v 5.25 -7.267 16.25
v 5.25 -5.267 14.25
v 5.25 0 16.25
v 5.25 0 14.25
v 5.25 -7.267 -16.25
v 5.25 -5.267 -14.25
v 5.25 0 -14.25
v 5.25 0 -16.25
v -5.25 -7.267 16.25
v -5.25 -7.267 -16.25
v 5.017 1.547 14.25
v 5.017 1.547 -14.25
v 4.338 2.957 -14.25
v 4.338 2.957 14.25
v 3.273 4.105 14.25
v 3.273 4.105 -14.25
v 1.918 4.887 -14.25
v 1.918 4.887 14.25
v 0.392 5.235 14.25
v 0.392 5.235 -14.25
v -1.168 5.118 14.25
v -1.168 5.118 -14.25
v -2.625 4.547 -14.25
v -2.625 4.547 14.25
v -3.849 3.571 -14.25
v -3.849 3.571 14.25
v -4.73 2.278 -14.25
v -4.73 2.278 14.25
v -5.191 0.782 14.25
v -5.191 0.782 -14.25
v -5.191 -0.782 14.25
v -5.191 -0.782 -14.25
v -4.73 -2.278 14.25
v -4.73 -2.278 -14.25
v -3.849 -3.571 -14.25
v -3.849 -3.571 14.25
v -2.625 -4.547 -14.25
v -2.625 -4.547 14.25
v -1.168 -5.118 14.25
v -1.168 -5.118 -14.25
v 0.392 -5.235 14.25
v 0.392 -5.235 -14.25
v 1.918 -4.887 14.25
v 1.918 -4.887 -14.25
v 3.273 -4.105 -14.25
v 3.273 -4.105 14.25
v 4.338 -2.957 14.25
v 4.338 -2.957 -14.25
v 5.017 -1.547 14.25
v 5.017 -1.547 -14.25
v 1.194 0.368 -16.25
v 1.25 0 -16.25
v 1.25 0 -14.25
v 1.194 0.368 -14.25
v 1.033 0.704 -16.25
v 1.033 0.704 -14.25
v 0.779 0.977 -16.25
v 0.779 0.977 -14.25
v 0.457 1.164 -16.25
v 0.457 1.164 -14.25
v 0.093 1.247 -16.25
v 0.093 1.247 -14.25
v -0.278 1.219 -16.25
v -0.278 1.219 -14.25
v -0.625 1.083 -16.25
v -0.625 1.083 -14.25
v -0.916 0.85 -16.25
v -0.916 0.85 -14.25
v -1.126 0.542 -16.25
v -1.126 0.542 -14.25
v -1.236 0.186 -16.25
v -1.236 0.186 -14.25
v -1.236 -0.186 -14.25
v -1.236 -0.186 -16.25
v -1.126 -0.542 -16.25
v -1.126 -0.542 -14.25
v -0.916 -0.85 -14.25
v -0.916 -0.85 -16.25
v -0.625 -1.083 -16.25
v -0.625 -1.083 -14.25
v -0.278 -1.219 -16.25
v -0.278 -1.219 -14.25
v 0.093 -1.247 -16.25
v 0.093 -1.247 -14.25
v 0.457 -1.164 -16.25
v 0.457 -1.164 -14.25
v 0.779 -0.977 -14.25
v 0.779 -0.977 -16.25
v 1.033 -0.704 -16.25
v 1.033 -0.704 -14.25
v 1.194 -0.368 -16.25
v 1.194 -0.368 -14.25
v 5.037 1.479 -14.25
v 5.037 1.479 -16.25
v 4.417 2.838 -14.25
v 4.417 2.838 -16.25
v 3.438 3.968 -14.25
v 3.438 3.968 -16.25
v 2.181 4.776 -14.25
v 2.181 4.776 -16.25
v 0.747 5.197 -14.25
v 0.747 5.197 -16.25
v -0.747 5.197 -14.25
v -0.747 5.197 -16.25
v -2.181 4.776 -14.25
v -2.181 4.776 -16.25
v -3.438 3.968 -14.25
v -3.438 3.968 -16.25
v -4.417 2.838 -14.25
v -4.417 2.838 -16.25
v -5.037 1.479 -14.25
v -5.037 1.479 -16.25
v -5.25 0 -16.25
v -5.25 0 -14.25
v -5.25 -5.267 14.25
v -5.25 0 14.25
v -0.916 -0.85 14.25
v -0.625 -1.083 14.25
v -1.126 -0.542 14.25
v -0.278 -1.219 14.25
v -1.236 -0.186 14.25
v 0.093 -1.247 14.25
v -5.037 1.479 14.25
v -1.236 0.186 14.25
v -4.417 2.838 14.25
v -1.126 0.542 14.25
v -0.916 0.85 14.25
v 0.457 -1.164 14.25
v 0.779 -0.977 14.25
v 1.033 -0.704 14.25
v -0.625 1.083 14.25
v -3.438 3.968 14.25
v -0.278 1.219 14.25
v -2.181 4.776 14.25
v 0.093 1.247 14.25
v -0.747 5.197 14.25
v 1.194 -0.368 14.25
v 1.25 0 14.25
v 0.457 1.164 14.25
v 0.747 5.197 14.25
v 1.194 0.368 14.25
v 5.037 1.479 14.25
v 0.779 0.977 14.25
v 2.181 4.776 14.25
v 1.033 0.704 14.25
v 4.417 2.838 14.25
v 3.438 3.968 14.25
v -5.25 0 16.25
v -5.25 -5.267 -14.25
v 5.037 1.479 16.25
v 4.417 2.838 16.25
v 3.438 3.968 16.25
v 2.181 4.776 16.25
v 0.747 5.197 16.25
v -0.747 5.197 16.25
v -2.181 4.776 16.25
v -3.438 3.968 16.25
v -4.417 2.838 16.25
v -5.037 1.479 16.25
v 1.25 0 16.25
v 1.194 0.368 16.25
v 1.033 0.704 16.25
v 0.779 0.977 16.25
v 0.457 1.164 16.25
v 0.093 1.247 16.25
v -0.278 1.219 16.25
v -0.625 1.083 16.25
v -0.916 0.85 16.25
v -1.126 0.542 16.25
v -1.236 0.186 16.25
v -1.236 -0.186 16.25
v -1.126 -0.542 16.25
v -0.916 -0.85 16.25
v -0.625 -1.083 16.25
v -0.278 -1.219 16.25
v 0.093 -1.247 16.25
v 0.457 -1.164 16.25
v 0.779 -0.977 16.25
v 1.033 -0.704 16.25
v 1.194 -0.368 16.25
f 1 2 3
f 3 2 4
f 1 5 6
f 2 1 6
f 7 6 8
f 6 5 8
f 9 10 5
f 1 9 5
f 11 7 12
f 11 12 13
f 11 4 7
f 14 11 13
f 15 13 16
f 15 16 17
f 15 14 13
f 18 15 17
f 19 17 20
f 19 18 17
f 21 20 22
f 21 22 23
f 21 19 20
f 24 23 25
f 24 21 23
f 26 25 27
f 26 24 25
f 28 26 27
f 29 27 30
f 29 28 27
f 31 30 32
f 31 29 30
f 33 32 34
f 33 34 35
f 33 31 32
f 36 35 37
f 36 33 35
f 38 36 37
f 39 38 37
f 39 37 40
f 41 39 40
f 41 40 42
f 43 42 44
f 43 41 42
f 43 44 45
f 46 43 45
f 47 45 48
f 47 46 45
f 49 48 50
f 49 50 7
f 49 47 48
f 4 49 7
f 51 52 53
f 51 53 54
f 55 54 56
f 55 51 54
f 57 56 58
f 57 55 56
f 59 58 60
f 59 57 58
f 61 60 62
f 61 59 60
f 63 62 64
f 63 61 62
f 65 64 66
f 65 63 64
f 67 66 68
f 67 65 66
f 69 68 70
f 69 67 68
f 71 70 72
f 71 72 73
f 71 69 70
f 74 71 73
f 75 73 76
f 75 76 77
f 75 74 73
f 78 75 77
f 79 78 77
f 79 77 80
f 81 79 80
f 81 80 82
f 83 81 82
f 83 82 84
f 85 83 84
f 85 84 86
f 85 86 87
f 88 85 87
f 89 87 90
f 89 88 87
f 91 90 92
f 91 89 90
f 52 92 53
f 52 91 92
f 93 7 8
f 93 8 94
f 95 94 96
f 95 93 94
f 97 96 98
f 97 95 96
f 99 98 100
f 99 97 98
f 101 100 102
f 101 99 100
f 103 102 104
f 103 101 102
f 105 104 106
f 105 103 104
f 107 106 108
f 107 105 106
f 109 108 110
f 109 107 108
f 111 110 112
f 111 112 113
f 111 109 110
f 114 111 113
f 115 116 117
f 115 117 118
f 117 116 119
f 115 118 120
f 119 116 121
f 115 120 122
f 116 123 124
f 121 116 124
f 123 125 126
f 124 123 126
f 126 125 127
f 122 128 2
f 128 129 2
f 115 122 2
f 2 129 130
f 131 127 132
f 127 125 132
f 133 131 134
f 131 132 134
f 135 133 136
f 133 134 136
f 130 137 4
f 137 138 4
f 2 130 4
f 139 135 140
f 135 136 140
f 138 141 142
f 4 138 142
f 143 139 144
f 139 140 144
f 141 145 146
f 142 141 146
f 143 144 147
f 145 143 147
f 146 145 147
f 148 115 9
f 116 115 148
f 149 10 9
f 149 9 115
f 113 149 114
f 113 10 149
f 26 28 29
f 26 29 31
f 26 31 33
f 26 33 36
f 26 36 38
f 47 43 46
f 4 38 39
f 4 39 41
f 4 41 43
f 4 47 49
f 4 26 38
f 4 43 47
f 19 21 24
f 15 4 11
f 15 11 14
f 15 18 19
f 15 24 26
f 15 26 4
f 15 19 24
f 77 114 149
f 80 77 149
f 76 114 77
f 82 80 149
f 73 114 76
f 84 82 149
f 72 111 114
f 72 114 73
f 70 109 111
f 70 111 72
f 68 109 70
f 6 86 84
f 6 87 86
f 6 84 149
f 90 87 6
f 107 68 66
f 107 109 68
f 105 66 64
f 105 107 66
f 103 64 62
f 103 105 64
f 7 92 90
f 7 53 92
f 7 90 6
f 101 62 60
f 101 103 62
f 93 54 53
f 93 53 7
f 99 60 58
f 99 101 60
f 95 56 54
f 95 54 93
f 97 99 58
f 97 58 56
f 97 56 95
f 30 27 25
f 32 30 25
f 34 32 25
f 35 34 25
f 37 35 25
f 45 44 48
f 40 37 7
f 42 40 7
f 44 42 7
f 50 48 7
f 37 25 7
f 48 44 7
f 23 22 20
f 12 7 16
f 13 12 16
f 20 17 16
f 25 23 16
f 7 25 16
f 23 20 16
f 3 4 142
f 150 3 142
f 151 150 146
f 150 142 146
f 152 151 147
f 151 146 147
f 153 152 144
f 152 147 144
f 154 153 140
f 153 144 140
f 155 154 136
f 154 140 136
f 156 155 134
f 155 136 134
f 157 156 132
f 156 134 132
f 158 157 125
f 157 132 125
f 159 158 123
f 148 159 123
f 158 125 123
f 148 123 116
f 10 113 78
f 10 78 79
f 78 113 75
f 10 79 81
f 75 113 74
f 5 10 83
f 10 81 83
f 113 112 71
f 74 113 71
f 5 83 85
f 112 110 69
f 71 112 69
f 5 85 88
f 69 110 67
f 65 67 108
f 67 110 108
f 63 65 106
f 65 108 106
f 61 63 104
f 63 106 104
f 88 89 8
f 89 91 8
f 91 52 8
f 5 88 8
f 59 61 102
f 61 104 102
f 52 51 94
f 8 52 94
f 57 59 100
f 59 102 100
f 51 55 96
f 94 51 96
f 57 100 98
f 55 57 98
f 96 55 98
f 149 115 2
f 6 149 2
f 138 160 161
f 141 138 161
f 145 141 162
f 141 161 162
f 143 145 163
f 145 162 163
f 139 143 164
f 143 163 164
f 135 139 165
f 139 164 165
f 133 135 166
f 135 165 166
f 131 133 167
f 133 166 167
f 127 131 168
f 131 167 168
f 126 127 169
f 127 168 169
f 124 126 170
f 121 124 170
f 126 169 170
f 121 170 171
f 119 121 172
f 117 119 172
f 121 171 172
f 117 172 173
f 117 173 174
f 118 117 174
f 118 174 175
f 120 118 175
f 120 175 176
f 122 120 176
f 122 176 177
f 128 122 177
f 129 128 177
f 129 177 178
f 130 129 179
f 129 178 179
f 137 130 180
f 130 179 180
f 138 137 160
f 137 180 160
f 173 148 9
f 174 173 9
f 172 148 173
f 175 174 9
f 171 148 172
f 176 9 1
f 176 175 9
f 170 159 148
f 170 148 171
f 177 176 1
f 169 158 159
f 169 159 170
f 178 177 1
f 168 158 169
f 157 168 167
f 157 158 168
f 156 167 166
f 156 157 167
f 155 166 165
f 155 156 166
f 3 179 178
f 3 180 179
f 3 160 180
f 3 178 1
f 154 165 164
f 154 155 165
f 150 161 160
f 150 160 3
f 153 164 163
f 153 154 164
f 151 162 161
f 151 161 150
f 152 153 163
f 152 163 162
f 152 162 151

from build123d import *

# Parameters (mm, degrees)
F0_R     = 5.25
F1_DEPTH = 14.25
F3_DEPTH = 2
F4_W     = 10.5
F4_H     = 2
F5_DEPTH = 16.25
F6_R     = 1.25
F7_DEPTH = 2


with BuildPart() as f1:
    # F0 (on Top) → F1 (new body, symmetric)
    with BuildSketch(Plane.XY):
        Circle(F0_R)
    extrude(amount=F1_DEPTH, both=True)


with BuildPart() as f3:
    # F2 (on face) → F3 (new body)
    with BuildSketch(Plane.XY.offset(14.25)):
        with BuildLine():
            Line((5.25, -5.2667460404), (5.25, 0))
            ThreePointArc((5.25, 0), (0, 5.25), (-5.25, 0))
            Line((-5.25, 0), (-5.25, -5.2667460404))
            Line((-5.25, -5.2667460404), (5.25, -5.2667460404))
        make_face()
    extrude(amount=F3_DEPTH)

    # F4 (on face) → F5 (join, through all)
    with BuildSketch(Plane.XY.offset(16.25)):
        with Locations((0, -6.2667460404)):
            Rectangle(F4_W, F4_H)
    extrude(amount=-F5_DEPTH)

    # F6 (on face) → F7 (cut, through all)
    with BuildSketch(Plane.XY.offset(16.25)):
        Circle(F6_R)
    extrude(amount=-F7_DEPTH, mode=Mode.SUBTRACT)

    # F8: F3 across plane


with BuildPart() as f3_1:
    add(f3.part)
    add(f3.part.mirror(Plane.XY))


solid = Compound([f1.part, f3_1.part])
